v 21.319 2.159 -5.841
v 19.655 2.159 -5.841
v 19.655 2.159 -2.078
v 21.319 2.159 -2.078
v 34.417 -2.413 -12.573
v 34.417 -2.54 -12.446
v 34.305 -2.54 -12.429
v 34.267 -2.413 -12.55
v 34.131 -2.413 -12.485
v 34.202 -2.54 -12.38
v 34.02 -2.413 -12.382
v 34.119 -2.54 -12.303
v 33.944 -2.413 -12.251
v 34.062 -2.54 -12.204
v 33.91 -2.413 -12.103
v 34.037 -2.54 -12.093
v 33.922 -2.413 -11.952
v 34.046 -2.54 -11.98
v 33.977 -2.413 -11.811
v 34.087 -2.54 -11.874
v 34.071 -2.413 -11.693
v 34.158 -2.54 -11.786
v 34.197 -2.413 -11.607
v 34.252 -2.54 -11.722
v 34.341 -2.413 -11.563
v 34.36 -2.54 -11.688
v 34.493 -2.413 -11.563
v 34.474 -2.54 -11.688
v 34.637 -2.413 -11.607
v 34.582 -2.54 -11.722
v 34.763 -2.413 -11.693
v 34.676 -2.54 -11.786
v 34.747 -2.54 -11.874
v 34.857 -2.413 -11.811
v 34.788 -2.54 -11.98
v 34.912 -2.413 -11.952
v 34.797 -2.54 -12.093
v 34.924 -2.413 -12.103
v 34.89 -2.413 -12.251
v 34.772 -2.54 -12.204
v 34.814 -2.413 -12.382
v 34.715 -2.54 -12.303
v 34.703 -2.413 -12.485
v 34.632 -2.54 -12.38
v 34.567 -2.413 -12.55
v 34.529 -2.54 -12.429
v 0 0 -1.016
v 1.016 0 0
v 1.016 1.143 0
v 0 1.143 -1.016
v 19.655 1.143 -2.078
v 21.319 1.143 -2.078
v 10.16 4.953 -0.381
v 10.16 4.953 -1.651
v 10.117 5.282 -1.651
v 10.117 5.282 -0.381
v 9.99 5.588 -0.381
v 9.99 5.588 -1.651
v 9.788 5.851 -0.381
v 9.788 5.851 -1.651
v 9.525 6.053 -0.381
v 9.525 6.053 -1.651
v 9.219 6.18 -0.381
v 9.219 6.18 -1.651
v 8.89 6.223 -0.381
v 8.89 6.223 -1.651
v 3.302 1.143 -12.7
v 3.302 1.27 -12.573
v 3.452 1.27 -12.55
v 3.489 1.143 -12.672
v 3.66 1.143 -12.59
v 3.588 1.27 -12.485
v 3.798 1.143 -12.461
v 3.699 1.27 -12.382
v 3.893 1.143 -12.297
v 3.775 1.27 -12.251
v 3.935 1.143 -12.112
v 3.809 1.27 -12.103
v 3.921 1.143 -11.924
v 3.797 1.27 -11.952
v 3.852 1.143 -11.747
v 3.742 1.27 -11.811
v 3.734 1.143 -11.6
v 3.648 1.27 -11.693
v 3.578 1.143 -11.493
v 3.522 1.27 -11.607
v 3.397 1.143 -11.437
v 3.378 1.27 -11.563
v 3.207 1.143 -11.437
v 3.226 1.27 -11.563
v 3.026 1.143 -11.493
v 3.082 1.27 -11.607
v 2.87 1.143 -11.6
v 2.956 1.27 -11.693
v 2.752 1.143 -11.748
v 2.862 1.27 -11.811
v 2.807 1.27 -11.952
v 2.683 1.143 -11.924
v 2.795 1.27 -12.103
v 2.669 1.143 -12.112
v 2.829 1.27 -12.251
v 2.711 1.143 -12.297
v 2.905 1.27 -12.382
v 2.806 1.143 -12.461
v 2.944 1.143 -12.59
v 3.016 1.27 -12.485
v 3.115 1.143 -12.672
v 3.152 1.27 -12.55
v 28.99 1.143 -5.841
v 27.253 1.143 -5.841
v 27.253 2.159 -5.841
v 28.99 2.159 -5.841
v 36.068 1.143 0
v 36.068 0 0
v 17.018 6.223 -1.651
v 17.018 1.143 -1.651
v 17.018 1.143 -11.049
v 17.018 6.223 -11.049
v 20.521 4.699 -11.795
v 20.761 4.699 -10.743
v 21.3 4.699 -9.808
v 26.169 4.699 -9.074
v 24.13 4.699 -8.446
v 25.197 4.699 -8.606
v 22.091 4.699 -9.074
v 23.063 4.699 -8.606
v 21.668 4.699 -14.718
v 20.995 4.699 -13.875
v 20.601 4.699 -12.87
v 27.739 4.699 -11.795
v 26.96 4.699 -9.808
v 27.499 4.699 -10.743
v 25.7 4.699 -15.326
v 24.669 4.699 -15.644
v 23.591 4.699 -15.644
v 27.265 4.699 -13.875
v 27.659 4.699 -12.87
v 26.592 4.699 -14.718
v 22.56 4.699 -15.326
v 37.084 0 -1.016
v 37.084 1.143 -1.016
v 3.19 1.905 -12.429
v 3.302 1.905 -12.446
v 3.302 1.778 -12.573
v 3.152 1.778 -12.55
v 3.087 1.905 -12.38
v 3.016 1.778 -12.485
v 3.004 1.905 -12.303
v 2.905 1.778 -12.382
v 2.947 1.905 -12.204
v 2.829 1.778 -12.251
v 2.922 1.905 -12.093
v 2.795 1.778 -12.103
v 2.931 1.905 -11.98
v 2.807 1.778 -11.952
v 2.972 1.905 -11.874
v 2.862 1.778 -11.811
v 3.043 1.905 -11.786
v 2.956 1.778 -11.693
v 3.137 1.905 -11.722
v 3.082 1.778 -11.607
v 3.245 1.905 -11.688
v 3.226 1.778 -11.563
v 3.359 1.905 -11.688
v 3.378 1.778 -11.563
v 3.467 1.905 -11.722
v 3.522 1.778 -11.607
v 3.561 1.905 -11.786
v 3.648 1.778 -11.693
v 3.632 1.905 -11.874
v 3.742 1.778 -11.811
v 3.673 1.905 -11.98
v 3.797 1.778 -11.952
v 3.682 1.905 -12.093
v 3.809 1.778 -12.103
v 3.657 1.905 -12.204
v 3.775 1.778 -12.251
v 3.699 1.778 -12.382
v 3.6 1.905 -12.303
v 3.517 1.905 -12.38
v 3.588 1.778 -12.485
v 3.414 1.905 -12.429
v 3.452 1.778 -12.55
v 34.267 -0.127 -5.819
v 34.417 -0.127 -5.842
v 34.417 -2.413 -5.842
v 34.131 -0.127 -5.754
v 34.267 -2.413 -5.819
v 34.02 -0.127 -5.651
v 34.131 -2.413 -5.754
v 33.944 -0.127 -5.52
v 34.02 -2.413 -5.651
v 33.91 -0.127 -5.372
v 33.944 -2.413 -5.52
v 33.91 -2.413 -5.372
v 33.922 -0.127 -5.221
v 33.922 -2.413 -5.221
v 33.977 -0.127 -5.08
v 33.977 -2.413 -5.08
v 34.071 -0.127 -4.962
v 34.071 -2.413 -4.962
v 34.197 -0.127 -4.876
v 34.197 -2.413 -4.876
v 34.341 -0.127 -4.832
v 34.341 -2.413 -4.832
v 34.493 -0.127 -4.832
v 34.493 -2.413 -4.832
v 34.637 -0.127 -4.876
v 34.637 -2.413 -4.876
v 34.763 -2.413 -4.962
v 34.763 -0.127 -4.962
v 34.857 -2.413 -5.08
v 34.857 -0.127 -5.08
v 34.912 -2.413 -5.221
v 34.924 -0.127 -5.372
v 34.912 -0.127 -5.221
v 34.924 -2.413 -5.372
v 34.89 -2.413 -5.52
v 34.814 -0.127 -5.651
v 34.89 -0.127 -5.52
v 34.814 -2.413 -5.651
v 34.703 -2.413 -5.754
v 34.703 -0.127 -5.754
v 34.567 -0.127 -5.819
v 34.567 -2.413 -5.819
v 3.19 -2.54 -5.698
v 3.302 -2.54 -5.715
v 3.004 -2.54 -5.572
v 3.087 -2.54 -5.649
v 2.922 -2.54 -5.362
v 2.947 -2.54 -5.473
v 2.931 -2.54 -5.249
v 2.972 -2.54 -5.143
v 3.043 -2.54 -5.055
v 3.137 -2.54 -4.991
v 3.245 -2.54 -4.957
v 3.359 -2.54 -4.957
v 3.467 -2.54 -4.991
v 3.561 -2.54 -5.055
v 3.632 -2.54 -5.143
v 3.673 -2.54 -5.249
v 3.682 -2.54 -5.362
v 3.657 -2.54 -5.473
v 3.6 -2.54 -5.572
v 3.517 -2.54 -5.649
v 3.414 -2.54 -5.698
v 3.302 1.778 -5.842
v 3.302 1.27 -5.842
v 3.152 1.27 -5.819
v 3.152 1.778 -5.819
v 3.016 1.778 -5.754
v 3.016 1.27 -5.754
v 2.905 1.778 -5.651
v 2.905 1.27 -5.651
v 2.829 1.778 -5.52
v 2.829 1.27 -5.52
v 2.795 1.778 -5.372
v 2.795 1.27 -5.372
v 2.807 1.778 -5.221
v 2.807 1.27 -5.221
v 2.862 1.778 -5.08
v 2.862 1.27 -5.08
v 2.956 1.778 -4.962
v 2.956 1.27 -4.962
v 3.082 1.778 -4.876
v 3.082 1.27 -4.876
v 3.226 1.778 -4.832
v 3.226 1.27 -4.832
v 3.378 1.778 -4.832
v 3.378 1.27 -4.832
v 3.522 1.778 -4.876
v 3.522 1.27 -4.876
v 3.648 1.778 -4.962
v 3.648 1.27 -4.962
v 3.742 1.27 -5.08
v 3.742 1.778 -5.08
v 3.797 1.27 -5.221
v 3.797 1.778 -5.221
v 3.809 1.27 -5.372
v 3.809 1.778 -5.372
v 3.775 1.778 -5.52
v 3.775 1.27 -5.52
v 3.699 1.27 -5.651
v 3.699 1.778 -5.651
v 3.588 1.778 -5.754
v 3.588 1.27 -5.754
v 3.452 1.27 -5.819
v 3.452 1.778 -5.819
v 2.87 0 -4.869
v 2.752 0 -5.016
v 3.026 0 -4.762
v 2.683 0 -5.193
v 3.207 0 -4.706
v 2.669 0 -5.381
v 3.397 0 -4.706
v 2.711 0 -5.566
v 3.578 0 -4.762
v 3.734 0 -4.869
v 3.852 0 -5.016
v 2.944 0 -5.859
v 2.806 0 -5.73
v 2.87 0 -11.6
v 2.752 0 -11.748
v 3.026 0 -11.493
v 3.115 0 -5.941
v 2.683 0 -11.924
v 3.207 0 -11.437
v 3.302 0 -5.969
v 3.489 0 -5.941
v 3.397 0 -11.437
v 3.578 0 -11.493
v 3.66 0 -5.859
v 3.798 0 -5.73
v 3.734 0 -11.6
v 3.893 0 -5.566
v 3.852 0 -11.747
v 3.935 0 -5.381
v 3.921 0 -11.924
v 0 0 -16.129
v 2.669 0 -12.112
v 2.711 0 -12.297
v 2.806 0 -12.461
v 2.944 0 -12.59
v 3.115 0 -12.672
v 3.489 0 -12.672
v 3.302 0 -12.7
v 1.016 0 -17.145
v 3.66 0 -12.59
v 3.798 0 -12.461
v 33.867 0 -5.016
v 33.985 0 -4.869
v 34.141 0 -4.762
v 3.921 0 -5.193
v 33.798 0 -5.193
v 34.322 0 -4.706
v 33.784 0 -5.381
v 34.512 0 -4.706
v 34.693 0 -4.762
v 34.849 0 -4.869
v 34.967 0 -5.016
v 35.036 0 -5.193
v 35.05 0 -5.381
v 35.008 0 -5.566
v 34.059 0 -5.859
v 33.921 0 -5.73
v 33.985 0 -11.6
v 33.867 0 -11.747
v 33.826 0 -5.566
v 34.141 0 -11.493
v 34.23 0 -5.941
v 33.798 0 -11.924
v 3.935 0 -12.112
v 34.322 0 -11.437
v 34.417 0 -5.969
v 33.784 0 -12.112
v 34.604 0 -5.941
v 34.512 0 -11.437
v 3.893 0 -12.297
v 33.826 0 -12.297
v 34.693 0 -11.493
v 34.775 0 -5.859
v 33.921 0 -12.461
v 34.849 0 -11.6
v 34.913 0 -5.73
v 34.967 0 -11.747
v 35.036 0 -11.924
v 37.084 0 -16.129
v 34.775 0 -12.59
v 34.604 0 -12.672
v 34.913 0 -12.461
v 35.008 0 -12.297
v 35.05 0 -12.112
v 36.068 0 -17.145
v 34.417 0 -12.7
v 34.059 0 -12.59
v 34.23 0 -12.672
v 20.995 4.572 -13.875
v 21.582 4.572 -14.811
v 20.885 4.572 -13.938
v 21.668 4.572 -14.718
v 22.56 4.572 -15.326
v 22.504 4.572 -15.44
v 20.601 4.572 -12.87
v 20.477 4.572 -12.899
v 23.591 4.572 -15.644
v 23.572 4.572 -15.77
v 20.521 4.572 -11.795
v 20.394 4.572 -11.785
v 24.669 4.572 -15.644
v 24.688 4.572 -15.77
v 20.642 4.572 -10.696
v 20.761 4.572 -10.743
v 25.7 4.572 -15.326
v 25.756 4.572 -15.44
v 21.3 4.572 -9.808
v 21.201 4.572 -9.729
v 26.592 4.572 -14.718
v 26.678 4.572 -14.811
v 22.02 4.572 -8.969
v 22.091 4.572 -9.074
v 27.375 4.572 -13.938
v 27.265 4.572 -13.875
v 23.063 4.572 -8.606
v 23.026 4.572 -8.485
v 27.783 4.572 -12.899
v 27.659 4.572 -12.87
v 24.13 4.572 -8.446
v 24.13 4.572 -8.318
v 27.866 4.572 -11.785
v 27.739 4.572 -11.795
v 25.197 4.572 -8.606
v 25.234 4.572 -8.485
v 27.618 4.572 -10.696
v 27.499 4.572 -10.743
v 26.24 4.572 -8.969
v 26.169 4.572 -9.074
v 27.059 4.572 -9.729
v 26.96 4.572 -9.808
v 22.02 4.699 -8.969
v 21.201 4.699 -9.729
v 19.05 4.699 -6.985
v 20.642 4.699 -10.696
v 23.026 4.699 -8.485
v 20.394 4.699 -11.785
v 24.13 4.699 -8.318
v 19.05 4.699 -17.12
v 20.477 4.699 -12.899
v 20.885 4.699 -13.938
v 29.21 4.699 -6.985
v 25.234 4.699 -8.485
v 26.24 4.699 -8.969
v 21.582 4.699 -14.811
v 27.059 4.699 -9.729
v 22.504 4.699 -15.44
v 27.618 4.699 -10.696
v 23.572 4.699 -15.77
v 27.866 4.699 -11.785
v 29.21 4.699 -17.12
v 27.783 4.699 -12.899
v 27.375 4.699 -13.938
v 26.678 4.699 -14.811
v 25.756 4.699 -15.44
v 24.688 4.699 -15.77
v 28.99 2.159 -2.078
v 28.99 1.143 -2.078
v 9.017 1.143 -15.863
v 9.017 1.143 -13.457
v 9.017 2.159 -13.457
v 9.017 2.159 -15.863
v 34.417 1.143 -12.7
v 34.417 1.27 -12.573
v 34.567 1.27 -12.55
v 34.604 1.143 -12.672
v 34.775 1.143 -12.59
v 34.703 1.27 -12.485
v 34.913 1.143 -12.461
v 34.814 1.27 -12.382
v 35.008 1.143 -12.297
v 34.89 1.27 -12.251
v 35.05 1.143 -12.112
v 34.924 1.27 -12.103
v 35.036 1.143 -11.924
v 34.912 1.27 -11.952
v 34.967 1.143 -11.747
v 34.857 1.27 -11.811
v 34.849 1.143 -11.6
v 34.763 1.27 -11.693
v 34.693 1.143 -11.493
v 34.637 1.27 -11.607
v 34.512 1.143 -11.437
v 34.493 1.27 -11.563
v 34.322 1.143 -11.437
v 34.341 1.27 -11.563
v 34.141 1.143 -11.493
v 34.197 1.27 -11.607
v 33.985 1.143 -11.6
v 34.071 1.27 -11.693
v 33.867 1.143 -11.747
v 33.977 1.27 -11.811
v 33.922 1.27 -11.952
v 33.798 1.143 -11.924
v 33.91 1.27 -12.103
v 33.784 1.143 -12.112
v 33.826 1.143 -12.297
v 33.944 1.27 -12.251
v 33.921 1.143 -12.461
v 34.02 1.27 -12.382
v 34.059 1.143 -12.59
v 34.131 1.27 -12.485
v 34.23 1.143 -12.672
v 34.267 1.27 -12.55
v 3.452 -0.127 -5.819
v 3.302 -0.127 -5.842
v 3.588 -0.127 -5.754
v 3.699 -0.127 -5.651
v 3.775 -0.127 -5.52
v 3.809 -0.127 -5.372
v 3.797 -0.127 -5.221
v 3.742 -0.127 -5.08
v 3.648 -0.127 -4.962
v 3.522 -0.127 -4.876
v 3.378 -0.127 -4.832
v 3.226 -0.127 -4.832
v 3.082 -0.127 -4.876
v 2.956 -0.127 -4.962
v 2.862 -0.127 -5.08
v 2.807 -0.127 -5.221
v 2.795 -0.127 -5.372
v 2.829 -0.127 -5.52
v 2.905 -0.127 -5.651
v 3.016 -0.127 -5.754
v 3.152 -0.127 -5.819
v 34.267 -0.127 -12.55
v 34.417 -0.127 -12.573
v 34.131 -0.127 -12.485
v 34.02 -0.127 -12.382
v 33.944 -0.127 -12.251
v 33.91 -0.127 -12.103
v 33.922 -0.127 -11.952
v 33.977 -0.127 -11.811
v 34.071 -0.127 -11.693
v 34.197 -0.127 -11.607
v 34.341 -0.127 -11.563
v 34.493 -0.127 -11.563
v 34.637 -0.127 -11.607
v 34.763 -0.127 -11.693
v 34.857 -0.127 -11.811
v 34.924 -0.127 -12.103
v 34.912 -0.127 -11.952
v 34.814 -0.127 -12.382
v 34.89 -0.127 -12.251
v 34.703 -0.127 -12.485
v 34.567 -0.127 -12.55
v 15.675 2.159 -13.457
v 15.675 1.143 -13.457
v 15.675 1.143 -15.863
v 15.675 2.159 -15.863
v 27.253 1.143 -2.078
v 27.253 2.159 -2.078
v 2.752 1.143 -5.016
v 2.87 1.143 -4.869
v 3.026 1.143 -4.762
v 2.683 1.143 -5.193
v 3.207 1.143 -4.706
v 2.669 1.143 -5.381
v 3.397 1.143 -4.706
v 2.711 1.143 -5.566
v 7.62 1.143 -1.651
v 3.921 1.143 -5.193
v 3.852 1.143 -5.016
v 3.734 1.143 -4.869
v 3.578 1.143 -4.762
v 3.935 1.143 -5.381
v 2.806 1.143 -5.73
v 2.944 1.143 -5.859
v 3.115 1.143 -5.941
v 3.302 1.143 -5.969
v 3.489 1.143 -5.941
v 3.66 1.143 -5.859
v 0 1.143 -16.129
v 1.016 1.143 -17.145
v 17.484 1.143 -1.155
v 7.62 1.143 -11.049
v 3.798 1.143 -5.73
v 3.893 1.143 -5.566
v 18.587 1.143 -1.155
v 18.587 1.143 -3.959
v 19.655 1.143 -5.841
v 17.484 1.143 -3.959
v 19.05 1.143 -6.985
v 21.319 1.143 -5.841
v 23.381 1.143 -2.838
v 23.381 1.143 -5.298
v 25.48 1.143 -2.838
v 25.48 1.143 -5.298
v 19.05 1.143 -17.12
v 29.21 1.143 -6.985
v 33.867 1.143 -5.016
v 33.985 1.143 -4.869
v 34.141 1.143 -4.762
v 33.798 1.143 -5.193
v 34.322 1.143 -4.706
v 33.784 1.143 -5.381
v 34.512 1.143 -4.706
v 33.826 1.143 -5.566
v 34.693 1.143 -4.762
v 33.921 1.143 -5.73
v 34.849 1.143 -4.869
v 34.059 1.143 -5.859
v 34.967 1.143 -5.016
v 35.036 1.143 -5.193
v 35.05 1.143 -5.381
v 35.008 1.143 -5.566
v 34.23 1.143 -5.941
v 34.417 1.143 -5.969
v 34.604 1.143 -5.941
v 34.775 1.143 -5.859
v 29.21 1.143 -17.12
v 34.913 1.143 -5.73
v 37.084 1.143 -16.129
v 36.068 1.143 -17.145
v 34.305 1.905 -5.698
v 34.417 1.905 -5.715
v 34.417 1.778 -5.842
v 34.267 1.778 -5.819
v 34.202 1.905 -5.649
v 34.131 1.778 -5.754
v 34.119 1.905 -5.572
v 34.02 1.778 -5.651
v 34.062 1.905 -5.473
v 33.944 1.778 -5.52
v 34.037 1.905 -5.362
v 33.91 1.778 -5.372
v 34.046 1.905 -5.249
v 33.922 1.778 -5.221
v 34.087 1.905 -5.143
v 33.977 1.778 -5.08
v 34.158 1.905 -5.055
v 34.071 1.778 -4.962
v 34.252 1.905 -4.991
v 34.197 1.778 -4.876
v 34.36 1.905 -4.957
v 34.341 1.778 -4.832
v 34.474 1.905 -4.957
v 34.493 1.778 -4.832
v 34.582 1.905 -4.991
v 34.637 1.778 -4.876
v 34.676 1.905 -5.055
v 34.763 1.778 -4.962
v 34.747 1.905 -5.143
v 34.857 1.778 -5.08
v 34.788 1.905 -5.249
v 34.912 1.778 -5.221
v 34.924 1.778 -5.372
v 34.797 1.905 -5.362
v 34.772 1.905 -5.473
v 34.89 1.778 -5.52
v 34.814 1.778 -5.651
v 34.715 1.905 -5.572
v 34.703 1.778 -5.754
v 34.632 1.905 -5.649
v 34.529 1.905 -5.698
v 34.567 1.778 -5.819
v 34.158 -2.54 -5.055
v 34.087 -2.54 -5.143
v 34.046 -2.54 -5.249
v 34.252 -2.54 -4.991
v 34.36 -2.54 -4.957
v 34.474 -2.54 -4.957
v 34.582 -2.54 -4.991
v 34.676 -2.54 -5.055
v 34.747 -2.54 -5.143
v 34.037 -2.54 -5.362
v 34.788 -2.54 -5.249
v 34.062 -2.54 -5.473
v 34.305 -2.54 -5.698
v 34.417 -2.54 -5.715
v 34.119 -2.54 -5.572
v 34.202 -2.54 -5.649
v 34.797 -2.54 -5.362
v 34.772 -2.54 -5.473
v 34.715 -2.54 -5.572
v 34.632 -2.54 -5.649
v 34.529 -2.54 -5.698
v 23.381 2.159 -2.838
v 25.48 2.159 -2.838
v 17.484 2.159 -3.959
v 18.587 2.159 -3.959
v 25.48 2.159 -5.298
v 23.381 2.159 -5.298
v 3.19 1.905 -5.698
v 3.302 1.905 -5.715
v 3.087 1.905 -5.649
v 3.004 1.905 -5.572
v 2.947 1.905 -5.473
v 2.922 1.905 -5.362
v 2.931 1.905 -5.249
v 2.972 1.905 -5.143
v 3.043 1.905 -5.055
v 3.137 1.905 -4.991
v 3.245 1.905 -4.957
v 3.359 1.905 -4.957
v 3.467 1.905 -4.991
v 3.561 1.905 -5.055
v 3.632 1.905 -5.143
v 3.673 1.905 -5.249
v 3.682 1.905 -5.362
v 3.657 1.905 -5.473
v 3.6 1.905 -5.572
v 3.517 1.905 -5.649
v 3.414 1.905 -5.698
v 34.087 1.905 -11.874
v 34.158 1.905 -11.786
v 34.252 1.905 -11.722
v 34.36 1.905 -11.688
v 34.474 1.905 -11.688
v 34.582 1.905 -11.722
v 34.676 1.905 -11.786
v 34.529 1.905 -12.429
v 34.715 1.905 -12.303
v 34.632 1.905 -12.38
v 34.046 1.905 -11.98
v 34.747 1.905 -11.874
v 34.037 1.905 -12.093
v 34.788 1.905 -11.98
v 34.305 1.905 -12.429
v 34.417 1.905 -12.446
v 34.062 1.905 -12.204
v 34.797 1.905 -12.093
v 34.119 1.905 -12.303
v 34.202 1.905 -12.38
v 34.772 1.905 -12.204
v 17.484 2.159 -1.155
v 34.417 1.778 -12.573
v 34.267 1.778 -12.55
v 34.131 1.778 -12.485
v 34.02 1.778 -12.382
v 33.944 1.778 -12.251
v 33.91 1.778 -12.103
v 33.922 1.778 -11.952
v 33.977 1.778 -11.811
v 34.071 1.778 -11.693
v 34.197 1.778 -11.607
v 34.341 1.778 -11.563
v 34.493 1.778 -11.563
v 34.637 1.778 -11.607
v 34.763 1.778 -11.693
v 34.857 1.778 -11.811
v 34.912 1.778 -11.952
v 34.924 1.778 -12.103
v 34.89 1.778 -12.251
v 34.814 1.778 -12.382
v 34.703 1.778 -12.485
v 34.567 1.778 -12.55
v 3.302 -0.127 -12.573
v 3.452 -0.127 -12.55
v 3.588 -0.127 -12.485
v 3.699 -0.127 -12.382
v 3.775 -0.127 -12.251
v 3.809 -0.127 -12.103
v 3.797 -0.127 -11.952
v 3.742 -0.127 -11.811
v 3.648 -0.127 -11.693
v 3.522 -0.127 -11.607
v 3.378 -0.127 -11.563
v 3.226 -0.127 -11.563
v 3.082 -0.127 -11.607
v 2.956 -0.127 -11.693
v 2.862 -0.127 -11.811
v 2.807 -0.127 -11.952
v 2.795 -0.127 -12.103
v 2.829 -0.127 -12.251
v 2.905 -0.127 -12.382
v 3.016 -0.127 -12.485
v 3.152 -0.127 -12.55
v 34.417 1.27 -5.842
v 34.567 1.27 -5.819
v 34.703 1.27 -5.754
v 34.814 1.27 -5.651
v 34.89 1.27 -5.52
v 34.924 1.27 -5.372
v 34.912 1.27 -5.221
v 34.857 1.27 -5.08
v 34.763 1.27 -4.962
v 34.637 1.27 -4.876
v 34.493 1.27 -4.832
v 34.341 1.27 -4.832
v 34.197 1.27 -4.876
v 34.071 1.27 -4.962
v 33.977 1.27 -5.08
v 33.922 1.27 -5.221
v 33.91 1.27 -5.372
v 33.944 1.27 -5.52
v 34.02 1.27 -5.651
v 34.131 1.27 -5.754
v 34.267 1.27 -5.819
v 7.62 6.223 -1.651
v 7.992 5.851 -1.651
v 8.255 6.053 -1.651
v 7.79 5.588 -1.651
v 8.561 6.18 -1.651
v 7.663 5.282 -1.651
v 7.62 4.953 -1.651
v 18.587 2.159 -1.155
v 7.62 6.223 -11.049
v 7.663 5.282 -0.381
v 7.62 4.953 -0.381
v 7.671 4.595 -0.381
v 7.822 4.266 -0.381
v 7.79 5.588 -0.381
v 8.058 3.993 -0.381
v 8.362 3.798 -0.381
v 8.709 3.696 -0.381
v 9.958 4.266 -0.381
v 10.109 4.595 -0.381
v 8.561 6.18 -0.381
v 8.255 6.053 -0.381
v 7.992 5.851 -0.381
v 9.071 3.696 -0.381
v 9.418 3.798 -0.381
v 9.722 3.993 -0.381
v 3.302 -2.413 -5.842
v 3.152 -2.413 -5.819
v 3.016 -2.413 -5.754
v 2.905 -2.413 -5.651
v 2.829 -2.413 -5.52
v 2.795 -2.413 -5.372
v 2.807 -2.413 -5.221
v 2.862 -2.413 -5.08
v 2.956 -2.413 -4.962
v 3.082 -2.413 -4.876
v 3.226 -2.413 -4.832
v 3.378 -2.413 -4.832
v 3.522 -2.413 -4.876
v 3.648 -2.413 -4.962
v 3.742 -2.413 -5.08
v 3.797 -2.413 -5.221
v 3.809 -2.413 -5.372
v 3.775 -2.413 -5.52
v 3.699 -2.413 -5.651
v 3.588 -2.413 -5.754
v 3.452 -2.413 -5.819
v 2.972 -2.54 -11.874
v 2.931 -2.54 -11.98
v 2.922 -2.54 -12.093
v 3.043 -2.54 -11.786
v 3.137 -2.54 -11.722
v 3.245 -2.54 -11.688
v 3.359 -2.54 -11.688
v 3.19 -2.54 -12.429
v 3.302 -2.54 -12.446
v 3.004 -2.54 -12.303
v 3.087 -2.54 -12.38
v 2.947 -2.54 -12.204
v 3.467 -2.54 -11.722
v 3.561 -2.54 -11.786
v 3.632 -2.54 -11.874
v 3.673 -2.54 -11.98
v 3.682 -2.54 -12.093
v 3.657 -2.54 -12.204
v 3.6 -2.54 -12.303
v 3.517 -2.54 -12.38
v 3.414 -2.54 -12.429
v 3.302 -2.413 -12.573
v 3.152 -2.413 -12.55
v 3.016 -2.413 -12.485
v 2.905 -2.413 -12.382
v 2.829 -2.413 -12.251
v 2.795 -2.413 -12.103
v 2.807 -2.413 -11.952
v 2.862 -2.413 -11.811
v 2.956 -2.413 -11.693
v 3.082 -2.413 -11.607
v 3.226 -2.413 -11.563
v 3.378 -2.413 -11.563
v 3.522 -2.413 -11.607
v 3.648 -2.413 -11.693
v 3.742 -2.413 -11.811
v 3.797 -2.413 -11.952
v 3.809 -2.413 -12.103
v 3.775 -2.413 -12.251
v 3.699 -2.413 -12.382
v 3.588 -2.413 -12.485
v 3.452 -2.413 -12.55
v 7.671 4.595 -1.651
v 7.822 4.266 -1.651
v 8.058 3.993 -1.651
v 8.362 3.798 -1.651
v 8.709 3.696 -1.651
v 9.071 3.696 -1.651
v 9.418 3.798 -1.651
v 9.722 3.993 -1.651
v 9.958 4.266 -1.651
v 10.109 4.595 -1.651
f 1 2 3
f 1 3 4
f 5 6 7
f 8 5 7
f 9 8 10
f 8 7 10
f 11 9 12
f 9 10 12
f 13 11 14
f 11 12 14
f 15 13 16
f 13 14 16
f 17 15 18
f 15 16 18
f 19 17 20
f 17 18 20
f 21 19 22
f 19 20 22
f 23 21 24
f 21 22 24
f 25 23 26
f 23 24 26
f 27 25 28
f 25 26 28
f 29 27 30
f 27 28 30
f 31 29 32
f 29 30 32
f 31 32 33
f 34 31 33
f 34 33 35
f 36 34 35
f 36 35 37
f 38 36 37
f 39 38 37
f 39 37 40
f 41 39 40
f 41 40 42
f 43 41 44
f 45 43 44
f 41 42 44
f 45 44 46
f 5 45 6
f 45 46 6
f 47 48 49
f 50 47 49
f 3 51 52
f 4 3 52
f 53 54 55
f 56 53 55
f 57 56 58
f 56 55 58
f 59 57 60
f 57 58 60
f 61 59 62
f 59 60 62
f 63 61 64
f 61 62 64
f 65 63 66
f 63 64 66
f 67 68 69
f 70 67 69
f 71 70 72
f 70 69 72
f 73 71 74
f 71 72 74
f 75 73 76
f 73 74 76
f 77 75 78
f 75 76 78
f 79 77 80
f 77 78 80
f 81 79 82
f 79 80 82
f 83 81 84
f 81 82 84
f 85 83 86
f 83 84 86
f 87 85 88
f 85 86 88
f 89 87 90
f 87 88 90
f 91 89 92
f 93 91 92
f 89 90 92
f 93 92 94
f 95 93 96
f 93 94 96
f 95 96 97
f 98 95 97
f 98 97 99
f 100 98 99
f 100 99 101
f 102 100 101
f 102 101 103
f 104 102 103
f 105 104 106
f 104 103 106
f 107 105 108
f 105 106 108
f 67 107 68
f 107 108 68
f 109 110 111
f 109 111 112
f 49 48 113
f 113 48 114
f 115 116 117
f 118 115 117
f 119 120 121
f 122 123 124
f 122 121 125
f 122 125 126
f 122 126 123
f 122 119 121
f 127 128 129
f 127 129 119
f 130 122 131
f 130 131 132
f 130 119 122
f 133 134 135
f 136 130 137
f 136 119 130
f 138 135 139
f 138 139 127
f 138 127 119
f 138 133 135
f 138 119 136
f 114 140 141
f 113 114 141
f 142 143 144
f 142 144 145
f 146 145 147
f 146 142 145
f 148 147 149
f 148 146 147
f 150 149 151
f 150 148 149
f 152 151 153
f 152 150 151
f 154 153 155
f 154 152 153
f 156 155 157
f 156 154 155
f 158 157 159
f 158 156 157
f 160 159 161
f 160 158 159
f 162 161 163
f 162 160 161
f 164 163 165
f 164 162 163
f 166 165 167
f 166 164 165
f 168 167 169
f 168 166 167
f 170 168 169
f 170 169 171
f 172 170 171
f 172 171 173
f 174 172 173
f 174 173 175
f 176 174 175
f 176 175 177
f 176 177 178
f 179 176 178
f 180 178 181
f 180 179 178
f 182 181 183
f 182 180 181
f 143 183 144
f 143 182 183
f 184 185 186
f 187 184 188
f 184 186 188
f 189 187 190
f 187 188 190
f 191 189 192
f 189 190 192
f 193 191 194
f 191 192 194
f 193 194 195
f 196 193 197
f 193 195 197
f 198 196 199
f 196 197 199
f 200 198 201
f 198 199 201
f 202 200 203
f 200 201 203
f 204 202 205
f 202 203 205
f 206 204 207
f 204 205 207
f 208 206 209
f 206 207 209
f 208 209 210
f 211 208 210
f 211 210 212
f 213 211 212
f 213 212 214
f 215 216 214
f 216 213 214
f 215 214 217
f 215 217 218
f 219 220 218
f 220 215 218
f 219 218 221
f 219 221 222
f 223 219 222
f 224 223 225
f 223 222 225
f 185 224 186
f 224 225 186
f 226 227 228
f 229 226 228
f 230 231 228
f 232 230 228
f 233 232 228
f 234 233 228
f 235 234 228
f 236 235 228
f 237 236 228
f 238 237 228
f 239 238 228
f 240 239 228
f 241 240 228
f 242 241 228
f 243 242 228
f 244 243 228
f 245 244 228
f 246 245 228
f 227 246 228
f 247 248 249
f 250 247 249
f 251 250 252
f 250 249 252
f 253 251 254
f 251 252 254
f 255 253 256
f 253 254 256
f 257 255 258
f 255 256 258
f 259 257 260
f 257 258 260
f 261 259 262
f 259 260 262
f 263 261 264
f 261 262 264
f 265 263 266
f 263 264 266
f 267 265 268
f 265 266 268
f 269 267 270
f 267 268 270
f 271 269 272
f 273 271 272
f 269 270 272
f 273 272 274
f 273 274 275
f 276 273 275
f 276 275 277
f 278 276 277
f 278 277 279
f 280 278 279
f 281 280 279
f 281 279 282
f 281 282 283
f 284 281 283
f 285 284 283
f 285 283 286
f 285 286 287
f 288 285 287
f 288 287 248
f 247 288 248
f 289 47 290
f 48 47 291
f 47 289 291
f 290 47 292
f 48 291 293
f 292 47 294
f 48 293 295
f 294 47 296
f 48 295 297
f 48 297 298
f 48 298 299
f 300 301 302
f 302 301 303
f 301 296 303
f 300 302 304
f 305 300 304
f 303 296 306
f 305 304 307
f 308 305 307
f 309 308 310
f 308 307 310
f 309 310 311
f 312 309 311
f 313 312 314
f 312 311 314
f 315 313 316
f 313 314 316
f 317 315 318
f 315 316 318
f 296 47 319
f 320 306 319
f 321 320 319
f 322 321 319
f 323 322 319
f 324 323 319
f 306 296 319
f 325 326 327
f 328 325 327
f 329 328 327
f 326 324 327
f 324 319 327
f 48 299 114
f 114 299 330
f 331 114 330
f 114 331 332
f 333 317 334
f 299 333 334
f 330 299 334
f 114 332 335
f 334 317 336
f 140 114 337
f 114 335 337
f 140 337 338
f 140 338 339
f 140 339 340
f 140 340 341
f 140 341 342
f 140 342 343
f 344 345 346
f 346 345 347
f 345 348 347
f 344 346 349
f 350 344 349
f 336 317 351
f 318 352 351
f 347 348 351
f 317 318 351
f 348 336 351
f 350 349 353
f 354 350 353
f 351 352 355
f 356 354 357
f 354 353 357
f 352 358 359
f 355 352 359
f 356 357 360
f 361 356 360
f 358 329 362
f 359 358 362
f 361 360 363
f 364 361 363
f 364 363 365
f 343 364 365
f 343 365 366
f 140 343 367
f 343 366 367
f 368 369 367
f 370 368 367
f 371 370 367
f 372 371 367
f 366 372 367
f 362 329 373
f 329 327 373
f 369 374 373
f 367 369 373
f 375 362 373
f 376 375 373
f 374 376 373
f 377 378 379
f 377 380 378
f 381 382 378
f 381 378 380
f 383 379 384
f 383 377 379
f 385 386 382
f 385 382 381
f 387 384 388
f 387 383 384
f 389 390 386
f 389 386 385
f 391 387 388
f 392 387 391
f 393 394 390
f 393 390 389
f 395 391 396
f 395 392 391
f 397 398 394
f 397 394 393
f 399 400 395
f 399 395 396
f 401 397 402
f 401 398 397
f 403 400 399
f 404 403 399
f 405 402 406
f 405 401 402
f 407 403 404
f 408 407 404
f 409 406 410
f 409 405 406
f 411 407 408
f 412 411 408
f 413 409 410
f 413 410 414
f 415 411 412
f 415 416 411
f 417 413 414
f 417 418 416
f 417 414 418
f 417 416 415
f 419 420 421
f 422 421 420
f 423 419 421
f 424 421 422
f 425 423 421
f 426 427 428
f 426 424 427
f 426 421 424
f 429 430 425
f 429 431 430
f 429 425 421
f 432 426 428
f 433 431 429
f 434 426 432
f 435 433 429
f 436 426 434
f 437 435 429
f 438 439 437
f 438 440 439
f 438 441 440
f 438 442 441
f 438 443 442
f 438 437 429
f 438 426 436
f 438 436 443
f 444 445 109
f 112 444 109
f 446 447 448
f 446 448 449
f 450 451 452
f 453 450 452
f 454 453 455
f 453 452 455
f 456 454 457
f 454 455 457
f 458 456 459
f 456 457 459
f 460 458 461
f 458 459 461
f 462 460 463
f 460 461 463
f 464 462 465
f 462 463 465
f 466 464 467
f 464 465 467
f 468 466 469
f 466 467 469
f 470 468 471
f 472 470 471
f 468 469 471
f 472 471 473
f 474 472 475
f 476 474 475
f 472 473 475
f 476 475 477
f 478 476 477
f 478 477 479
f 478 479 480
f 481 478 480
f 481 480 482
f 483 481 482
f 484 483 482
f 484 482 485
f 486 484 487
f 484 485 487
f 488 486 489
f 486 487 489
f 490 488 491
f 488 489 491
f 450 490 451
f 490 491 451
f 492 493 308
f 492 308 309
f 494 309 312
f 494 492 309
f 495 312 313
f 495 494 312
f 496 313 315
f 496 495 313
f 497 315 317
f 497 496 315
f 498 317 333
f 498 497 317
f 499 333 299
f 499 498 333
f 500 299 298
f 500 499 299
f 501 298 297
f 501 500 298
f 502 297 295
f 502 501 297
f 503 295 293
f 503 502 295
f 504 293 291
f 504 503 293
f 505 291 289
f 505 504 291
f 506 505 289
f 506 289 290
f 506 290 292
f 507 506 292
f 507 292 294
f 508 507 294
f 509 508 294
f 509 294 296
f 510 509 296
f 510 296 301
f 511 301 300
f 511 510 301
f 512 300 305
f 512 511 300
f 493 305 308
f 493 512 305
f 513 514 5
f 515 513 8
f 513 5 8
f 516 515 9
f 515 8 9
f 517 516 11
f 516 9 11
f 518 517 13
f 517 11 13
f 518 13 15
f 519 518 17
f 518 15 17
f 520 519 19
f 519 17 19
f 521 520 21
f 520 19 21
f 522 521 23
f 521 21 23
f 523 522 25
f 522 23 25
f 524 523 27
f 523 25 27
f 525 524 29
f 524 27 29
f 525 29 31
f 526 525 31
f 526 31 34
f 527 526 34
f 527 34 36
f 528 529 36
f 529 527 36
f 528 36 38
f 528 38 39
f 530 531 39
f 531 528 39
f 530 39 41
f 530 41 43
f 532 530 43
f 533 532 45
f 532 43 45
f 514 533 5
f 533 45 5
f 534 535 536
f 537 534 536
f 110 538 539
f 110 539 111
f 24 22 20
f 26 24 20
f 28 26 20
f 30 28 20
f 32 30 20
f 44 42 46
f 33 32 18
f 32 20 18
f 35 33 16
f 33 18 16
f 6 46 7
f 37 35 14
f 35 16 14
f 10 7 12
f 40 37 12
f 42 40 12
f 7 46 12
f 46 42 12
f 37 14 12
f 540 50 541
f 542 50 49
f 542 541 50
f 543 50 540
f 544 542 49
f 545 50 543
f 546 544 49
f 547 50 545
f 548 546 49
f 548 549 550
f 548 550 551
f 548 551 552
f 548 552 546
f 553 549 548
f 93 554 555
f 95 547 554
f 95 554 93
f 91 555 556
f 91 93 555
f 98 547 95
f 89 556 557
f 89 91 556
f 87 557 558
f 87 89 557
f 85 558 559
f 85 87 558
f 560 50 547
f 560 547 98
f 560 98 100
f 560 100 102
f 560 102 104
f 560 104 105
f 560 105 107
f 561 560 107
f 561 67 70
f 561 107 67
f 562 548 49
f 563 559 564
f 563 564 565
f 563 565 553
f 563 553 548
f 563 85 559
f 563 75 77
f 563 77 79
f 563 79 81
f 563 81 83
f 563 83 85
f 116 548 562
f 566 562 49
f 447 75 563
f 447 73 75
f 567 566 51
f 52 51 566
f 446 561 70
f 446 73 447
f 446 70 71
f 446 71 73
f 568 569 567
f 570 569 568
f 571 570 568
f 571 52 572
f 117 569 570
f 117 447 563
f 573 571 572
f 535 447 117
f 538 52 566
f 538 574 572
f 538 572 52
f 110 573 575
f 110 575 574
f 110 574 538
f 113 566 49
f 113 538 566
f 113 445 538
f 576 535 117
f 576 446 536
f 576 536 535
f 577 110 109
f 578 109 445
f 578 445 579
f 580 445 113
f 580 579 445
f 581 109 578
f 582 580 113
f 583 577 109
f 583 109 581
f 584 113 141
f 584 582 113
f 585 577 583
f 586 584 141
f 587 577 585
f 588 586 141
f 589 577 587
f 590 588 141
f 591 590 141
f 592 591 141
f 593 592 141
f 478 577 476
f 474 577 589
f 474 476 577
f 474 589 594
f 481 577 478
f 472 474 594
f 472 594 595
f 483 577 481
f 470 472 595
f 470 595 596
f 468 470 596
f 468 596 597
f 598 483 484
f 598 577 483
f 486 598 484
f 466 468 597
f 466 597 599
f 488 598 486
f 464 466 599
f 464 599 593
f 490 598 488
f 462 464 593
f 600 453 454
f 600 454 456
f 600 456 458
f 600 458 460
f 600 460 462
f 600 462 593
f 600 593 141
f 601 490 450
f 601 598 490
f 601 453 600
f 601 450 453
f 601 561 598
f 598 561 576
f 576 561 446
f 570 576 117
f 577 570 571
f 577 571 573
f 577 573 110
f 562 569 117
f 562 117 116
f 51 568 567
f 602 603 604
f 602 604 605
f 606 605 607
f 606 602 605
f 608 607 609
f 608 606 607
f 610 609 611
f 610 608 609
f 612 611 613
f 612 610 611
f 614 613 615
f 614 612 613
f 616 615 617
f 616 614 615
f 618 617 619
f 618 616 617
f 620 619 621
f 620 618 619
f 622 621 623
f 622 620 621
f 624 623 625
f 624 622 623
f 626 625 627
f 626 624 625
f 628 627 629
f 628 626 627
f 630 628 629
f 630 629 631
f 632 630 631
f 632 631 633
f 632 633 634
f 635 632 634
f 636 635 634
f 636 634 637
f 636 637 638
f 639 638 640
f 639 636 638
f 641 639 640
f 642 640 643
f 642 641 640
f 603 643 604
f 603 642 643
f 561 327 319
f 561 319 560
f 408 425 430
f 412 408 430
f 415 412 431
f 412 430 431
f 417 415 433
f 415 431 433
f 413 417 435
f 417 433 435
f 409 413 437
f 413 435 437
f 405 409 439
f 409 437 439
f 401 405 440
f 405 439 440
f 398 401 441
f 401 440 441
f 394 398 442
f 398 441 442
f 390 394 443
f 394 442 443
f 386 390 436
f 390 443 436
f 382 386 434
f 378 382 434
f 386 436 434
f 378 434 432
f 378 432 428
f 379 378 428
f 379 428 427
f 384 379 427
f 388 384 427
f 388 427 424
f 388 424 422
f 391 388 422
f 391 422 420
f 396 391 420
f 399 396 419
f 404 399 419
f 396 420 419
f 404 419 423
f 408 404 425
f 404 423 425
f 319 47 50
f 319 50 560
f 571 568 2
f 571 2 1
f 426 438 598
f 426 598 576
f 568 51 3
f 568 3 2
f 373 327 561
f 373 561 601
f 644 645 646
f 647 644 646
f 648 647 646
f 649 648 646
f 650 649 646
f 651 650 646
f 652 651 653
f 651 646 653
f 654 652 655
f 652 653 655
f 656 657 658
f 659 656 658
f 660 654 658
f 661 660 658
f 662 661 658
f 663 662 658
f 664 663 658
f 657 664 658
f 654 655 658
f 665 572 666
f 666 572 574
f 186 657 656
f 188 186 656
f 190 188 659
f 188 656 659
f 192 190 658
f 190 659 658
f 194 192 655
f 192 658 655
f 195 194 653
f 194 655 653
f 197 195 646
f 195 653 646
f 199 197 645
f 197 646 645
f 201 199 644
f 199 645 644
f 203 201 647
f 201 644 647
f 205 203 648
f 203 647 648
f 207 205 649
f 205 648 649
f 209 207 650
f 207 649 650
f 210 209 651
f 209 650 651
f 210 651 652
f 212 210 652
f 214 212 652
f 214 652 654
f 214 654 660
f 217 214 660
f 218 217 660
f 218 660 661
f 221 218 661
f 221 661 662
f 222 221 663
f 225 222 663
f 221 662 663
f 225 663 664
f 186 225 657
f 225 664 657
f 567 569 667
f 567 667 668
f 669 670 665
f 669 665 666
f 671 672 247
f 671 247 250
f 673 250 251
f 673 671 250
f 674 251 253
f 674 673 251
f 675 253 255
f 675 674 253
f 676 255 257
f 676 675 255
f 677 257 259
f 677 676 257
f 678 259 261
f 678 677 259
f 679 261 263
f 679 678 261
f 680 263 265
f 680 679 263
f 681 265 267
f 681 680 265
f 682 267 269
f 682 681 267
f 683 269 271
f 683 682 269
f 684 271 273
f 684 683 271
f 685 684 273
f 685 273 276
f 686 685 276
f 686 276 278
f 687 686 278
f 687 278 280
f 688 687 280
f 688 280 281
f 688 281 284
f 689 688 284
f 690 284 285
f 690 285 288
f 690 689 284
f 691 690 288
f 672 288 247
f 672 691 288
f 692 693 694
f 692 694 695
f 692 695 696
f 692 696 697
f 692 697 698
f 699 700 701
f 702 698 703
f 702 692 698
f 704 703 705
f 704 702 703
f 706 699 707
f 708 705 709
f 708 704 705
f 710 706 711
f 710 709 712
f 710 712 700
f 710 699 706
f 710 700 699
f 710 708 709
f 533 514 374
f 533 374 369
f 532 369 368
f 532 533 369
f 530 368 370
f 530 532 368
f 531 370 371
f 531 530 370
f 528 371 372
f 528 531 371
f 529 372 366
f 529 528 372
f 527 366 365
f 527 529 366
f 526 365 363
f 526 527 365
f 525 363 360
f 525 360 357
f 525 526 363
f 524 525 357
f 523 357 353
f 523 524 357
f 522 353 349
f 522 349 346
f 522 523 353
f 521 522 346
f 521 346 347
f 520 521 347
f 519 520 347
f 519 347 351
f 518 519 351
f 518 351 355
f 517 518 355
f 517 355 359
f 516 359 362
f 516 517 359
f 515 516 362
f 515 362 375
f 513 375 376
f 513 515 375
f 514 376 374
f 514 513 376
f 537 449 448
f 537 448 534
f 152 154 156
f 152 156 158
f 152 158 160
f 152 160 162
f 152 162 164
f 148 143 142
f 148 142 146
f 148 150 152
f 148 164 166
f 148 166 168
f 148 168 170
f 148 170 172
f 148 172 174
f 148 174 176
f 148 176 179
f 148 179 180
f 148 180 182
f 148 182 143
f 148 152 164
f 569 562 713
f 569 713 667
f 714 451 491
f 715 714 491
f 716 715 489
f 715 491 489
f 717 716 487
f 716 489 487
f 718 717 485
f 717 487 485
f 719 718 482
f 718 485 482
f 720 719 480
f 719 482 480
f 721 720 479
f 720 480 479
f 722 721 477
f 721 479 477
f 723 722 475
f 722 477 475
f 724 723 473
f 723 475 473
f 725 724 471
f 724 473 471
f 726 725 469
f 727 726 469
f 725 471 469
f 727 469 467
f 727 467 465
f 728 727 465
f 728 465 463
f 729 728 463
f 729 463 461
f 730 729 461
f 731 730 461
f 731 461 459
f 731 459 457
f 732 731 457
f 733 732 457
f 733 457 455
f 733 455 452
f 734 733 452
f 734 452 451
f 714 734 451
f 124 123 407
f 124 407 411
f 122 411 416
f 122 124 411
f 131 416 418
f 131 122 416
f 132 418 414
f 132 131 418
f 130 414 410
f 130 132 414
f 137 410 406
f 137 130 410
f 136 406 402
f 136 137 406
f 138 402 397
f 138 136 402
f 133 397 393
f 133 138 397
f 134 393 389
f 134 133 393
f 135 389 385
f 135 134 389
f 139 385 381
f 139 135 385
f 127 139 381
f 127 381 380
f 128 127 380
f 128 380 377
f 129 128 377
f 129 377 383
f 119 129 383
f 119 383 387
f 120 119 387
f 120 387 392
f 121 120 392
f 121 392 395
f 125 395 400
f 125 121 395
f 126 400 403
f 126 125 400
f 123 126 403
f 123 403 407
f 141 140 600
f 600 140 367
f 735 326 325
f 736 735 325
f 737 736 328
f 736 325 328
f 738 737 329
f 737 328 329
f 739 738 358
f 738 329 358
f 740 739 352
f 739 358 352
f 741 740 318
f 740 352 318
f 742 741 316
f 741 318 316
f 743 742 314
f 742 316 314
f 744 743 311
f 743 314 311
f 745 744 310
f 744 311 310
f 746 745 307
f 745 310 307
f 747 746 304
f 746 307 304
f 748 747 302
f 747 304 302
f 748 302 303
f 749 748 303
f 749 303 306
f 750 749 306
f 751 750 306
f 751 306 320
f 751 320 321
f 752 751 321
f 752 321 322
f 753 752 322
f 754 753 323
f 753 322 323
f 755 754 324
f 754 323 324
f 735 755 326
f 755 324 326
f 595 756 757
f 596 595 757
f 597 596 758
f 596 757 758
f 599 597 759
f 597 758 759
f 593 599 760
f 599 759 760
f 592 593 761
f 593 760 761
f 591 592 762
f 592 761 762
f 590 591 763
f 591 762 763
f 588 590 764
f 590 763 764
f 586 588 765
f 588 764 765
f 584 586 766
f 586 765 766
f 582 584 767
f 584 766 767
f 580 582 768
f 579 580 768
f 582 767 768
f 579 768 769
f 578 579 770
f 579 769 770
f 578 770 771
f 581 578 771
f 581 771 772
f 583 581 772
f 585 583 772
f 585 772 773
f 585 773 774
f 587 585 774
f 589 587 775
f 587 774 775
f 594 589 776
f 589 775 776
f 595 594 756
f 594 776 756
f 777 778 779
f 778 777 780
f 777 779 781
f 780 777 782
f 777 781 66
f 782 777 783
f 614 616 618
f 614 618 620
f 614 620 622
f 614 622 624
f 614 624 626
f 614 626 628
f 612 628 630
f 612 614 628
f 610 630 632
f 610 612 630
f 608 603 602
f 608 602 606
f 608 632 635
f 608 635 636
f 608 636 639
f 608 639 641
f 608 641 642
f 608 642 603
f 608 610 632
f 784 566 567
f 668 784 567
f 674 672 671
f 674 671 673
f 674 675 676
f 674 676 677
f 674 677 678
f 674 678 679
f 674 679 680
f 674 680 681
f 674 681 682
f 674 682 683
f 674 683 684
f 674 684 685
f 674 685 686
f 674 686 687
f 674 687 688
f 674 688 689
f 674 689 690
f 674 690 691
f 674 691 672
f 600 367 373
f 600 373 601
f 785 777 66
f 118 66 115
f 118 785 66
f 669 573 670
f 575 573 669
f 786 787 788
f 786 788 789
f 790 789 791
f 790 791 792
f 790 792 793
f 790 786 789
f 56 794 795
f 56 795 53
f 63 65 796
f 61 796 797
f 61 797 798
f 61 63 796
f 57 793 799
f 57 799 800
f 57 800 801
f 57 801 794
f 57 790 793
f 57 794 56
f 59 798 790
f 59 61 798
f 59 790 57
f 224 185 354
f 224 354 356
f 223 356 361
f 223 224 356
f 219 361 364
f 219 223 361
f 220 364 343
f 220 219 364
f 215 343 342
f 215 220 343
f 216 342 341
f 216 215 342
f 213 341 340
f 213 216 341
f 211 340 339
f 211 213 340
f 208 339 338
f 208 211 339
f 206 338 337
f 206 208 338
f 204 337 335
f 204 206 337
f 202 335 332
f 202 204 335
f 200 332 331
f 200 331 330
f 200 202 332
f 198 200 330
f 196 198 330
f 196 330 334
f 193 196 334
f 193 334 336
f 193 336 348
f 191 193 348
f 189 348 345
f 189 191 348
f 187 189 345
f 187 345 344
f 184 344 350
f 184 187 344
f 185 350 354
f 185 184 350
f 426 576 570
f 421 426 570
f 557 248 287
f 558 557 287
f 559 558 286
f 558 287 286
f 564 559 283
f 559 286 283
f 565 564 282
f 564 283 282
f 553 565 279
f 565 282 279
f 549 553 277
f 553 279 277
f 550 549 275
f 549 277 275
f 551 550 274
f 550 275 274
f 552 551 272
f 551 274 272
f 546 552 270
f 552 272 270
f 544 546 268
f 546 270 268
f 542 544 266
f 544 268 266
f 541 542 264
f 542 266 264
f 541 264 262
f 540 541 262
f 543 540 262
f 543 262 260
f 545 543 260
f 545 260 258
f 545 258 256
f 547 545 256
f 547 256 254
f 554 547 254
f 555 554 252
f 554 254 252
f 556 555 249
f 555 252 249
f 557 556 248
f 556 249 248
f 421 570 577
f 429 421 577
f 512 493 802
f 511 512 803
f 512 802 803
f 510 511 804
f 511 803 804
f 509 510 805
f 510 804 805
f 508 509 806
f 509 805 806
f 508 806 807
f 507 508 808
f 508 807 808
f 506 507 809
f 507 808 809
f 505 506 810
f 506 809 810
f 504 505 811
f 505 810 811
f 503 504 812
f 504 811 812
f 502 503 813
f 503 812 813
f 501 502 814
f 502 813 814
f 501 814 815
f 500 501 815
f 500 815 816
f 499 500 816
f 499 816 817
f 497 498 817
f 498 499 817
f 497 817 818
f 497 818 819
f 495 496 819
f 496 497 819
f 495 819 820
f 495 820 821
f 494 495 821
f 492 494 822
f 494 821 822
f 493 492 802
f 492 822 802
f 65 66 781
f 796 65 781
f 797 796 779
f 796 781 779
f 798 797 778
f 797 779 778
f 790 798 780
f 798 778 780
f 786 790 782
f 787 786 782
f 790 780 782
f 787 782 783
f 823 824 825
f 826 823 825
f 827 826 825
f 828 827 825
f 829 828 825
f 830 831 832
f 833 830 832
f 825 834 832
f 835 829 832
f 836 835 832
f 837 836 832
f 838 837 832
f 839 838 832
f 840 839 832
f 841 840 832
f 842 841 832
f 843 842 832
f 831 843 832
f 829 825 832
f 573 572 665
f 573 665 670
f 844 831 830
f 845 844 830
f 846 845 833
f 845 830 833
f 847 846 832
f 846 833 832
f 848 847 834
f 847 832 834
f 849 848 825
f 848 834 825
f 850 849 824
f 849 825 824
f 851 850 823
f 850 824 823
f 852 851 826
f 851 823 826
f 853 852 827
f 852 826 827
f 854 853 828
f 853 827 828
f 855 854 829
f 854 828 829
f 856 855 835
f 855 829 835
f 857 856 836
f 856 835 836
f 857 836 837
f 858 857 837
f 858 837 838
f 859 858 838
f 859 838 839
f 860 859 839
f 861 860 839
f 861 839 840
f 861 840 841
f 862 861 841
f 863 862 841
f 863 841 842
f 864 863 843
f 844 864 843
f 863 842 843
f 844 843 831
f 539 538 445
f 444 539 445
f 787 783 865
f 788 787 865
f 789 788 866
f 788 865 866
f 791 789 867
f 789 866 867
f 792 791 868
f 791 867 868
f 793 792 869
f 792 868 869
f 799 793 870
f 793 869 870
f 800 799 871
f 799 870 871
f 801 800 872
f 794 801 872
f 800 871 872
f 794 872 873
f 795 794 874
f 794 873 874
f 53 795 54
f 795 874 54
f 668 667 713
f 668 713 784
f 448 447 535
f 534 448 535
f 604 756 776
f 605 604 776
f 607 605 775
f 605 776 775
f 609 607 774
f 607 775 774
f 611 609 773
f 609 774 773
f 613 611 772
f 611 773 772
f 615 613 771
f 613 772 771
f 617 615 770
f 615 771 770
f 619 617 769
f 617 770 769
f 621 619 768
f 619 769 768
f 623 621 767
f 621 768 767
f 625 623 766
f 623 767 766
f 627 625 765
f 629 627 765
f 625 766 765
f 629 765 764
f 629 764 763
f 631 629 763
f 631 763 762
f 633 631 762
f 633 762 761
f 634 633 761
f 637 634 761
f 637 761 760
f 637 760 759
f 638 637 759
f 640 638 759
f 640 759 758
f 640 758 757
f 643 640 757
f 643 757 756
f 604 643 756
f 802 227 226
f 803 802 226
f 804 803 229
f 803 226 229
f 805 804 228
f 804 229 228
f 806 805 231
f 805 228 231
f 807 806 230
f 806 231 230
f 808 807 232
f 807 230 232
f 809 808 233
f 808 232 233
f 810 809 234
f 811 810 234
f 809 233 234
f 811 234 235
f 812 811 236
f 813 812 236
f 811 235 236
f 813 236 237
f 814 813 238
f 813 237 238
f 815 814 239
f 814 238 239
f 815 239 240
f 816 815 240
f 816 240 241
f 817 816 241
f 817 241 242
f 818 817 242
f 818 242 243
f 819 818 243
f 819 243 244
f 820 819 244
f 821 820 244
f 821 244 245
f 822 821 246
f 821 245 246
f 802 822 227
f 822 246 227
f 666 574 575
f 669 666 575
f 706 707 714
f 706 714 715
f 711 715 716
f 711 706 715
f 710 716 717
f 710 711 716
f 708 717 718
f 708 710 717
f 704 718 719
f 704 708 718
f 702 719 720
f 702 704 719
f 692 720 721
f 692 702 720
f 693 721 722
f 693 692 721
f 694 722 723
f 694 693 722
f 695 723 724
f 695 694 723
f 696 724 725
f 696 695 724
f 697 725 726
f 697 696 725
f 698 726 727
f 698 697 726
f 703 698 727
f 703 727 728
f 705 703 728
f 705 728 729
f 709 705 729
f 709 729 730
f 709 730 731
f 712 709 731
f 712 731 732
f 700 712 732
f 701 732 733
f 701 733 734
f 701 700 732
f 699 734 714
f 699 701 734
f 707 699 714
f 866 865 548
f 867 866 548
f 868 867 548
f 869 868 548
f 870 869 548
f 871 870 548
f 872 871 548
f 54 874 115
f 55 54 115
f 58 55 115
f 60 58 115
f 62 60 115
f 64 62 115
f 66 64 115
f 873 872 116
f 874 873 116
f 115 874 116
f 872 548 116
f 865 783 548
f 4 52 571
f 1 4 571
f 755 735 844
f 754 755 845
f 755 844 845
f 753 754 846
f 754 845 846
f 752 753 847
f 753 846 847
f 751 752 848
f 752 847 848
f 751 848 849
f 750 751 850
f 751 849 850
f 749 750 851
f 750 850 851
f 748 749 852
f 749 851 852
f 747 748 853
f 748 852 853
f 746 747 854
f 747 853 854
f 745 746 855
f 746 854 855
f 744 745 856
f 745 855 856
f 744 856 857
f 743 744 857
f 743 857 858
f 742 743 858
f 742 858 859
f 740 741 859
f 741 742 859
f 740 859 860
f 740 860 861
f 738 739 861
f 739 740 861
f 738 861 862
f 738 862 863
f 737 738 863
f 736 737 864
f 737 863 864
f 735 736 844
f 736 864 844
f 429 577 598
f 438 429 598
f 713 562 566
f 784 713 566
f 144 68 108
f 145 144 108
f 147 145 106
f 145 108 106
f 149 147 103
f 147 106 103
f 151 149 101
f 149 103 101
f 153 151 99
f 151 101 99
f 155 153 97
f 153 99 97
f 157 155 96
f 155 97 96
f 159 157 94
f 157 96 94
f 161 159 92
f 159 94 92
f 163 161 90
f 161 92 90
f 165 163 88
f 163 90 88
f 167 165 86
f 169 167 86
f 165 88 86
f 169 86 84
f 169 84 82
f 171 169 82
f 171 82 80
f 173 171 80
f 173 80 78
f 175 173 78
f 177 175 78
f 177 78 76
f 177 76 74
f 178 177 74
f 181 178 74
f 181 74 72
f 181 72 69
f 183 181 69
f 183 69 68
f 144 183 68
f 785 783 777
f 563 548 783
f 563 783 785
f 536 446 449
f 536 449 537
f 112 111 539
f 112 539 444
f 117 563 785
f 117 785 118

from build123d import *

# Parameters (mm, degrees)
SKETCH1_W                = 37.084
SKETCH1_H                = 17.145
BOSS_EXTRUDE1_DEPTH      = 1.143
BOSS_EXTRUDE2_DEPTH      = 0.762
BOSS_EXTRUDE2_DEPTH_BACK = 3.683
SKETCH2_R                = 0.508
CHAMFER1_SIZE            = 0.127
SKETCH3_W                = 9.398
SKETCH3_H                = 9.398
BOSS_EXTRUDE3_DEPTH      = 5.08
BOSS_EXTRUDE4_DEPTH      = 3.556
SKETCH4_R                = 1.27
BOSS_EXTRUDE5_DEPTH      = 1.27
SKETCH5_R                = 3.7465
SKETCH5_R_2              = 3.6195
CUT_EXTRUDE1_DEPTH       = 0.127
SKETCH6_W                = 6.657539154
SKETCH6_H                = 2.406121488
SKETCH6_W_2              = 1.664384789
SKETCH6_H_2              = 3.762956913
SKETCH6_W_3              = 1.736749344
SKETCH6_W_4              = 2.098572125
SKETCH6_H_3              = 2.460394905
SKETCH6_W_5              = 1.10355948
SKETCH6_H_4              = 2.804126546
BOSS_EXTRUDE6_DEPTH      = 1.016
CHAMFER2_SIZE            = 1.016
SKETCH7_W                = 10.16
SKETCH7_H                = 3.556
CUT_EXTRUDE2_DEPTH       = 0.0254


with BuildPart() as part:
    # Sketch1 → Boss-Extrude1 (new body)
    with BuildSketch(Plane(origin=(0, 0, 0), x_dir=(1, 0, 0), z_dir=(0, 1, 0))):
        with Locations((18.542, 8.5725)):
            Rectangle(SKETCH1_W, SKETCH1_H)
    extrude(amount=BOSS_EXTRUDE1_DEPTH)

    # Sketch2 → Boss-Extrude2 (add, two sides: drawn at the far end of the back side and taken through both)
    with BuildSketch(Plane(origin=(0, 1.143, 0), x_dir=(1, 0, 0), z_dir=(0, 1, 0)).offset(-BOSS_EXTRUDE2_DEPTH_BACK)):
        with Locations((3.302, 12.065)):
            Circle(SKETCH2_R)
        with Locations((3.302, 5.334)):
            Circle(SKETCH2_R)
        with Locations((34.417, 12.065)):
            Circle(SKETCH2_R)
        with Locations((34.417, 5.334)):
            Circle(SKETCH2_R)
    extrude(amount=BOSS_EXTRUDE2_DEPTH + BOSS_EXTRUDE2_DEPTH_BACK)

    # Chamfer1
    chamfer1_edges = [part.edges().sort_by_distance(p)[0] for p in [
        (33.909, -2.54, -5.334),
        (33.909, 0, -5.334),
        (33.909, -2.54, -12.065),
        (33.909, 0, -12.065),
        (2.794, -2.54, -12.065),
        (2.794, 0, -12.065),
        (2.794, -2.54, -5.334),
        (2.794, 0, -5.334),
        (33.909, 1.143, -5.334),
        (33.909, 1.905, -5.334),
        (33.909, 1.143, -12.065),
        (33.909, 1.905, -12.065),
        (2.794, 1.143, -5.334),
        (2.794, 1.905, -5.334),
        (2.794, 1.143, -12.065),
        (2.794, 1.905, -12.065),
    ]]
    chamfer(chamfer1_edges, length=CHAMFER1_SIZE)

    # Sketch3 → Boss-Extrude3 (add)
    with BuildSketch(Plane(origin=(0, 1.143, 0), x_dir=(1, 0, 0), z_dir=(0, 1, 0))):
        with Locations((12.319, 6.35)):
            Rectangle(SKETCH3_W, SKETCH3_H)
    extrude(amount=BOSS_EXTRUDE3_DEPTH)

    # Sketch3<3> → Boss-Extrude4 (add)
    with BuildSketch(Plane(origin=(0, 1.143, 0), x_dir=(1, 0, 0), z_dir=(0, 1, 0))):
        Polygon((19.05, 17.145), (19.05, 11.049), (19.05, 6.985), (29.21, 6.985), (29.21, 17.145), align=None)
    extrude(amount=BOSS_EXTRUDE4_DEPTH)

    # Sketch4 → Boss-Extrude5 (add)
    with BuildSketch(Plane.XY.offset(-1.651)):
        with Locations((8.89, 4.953)):
            Circle(SKETCH4_R)
    extrude(amount=BOSS_EXTRUDE5_DEPTH)

    # Sketch5 → Cut-Extrude1 (cut)
    with BuildSketch(Plane(origin=(0, 4.699, 0), x_dir=(1, 0, 0), z_dir=(0, 1, 0))):
        with Locations((24.13, 12.065)):
            Circle(SKETCH5_R)
        with Locations((24.13, 12.065)):
            Circle(SKETCH5_R_2, mode=Mode.SUBTRACT)
    extrude(amount=-CUT_EXTRUDE1_DEPTH, mode=Mode.SUBTRACT)

    # Sketch6 → Boss-Extrude6 (add)
    with BuildSketch(Plane(origin=(0, 1.143, 0), x_dir=(1, 0, 0), z_dir=(0, 1, 0))):
        with Locations((12.34578489, 14.660168276)):
            Rectangle(SKETCH6_W, SKETCH6_H)
        with Locations((20.486797444, 3.959259553)):
            Rectangle(SKETCH6_W_2, SKETCH6_H_2)
        with Locations((28.121258104, 3.959259553)):
            Rectangle(SKETCH6_W_3, SKETCH6_H_2)
        with Locations((24.430665747, 4.067806388)):
            Rectangle(SKETCH6_W_4, SKETCH6_H_3)
        with Locations((18.035448108, 2.55719628)):
            Rectangle(SKETCH6_W_5, SKETCH6_H_4)
    extrude(amount=BOSS_EXTRUDE6_DEPTH)

    # Chamfer2
    chamfer2_edges = [part.edges().sort_by_distance(p)[0] for p in [
        (37.084, 0.5715, 0),
        (37.084, 0.5715, -17.145),
        (0, 0.5715, -17.145),
        (0, 0.5715, 0),
    ]]
    chamfer(chamfer2_edges, length=CHAMFER2_SIZE)

    # Sketch7 → Cut-Extrude2 (cut)
    with BuildSketch(Plane(origin=(0, 0, -17.145), x_dir=(-1, 0, 0), z_dir=(0, 0, -1))):
        with Locations((-24.13, 2.921)):
            Rectangle(SKETCH7_W, SKETCH7_H)
    extrude(amount=-CUT_EXTRUDE2_DEPTH, mode=Mode.SUBTRACT)


solid = part.part
